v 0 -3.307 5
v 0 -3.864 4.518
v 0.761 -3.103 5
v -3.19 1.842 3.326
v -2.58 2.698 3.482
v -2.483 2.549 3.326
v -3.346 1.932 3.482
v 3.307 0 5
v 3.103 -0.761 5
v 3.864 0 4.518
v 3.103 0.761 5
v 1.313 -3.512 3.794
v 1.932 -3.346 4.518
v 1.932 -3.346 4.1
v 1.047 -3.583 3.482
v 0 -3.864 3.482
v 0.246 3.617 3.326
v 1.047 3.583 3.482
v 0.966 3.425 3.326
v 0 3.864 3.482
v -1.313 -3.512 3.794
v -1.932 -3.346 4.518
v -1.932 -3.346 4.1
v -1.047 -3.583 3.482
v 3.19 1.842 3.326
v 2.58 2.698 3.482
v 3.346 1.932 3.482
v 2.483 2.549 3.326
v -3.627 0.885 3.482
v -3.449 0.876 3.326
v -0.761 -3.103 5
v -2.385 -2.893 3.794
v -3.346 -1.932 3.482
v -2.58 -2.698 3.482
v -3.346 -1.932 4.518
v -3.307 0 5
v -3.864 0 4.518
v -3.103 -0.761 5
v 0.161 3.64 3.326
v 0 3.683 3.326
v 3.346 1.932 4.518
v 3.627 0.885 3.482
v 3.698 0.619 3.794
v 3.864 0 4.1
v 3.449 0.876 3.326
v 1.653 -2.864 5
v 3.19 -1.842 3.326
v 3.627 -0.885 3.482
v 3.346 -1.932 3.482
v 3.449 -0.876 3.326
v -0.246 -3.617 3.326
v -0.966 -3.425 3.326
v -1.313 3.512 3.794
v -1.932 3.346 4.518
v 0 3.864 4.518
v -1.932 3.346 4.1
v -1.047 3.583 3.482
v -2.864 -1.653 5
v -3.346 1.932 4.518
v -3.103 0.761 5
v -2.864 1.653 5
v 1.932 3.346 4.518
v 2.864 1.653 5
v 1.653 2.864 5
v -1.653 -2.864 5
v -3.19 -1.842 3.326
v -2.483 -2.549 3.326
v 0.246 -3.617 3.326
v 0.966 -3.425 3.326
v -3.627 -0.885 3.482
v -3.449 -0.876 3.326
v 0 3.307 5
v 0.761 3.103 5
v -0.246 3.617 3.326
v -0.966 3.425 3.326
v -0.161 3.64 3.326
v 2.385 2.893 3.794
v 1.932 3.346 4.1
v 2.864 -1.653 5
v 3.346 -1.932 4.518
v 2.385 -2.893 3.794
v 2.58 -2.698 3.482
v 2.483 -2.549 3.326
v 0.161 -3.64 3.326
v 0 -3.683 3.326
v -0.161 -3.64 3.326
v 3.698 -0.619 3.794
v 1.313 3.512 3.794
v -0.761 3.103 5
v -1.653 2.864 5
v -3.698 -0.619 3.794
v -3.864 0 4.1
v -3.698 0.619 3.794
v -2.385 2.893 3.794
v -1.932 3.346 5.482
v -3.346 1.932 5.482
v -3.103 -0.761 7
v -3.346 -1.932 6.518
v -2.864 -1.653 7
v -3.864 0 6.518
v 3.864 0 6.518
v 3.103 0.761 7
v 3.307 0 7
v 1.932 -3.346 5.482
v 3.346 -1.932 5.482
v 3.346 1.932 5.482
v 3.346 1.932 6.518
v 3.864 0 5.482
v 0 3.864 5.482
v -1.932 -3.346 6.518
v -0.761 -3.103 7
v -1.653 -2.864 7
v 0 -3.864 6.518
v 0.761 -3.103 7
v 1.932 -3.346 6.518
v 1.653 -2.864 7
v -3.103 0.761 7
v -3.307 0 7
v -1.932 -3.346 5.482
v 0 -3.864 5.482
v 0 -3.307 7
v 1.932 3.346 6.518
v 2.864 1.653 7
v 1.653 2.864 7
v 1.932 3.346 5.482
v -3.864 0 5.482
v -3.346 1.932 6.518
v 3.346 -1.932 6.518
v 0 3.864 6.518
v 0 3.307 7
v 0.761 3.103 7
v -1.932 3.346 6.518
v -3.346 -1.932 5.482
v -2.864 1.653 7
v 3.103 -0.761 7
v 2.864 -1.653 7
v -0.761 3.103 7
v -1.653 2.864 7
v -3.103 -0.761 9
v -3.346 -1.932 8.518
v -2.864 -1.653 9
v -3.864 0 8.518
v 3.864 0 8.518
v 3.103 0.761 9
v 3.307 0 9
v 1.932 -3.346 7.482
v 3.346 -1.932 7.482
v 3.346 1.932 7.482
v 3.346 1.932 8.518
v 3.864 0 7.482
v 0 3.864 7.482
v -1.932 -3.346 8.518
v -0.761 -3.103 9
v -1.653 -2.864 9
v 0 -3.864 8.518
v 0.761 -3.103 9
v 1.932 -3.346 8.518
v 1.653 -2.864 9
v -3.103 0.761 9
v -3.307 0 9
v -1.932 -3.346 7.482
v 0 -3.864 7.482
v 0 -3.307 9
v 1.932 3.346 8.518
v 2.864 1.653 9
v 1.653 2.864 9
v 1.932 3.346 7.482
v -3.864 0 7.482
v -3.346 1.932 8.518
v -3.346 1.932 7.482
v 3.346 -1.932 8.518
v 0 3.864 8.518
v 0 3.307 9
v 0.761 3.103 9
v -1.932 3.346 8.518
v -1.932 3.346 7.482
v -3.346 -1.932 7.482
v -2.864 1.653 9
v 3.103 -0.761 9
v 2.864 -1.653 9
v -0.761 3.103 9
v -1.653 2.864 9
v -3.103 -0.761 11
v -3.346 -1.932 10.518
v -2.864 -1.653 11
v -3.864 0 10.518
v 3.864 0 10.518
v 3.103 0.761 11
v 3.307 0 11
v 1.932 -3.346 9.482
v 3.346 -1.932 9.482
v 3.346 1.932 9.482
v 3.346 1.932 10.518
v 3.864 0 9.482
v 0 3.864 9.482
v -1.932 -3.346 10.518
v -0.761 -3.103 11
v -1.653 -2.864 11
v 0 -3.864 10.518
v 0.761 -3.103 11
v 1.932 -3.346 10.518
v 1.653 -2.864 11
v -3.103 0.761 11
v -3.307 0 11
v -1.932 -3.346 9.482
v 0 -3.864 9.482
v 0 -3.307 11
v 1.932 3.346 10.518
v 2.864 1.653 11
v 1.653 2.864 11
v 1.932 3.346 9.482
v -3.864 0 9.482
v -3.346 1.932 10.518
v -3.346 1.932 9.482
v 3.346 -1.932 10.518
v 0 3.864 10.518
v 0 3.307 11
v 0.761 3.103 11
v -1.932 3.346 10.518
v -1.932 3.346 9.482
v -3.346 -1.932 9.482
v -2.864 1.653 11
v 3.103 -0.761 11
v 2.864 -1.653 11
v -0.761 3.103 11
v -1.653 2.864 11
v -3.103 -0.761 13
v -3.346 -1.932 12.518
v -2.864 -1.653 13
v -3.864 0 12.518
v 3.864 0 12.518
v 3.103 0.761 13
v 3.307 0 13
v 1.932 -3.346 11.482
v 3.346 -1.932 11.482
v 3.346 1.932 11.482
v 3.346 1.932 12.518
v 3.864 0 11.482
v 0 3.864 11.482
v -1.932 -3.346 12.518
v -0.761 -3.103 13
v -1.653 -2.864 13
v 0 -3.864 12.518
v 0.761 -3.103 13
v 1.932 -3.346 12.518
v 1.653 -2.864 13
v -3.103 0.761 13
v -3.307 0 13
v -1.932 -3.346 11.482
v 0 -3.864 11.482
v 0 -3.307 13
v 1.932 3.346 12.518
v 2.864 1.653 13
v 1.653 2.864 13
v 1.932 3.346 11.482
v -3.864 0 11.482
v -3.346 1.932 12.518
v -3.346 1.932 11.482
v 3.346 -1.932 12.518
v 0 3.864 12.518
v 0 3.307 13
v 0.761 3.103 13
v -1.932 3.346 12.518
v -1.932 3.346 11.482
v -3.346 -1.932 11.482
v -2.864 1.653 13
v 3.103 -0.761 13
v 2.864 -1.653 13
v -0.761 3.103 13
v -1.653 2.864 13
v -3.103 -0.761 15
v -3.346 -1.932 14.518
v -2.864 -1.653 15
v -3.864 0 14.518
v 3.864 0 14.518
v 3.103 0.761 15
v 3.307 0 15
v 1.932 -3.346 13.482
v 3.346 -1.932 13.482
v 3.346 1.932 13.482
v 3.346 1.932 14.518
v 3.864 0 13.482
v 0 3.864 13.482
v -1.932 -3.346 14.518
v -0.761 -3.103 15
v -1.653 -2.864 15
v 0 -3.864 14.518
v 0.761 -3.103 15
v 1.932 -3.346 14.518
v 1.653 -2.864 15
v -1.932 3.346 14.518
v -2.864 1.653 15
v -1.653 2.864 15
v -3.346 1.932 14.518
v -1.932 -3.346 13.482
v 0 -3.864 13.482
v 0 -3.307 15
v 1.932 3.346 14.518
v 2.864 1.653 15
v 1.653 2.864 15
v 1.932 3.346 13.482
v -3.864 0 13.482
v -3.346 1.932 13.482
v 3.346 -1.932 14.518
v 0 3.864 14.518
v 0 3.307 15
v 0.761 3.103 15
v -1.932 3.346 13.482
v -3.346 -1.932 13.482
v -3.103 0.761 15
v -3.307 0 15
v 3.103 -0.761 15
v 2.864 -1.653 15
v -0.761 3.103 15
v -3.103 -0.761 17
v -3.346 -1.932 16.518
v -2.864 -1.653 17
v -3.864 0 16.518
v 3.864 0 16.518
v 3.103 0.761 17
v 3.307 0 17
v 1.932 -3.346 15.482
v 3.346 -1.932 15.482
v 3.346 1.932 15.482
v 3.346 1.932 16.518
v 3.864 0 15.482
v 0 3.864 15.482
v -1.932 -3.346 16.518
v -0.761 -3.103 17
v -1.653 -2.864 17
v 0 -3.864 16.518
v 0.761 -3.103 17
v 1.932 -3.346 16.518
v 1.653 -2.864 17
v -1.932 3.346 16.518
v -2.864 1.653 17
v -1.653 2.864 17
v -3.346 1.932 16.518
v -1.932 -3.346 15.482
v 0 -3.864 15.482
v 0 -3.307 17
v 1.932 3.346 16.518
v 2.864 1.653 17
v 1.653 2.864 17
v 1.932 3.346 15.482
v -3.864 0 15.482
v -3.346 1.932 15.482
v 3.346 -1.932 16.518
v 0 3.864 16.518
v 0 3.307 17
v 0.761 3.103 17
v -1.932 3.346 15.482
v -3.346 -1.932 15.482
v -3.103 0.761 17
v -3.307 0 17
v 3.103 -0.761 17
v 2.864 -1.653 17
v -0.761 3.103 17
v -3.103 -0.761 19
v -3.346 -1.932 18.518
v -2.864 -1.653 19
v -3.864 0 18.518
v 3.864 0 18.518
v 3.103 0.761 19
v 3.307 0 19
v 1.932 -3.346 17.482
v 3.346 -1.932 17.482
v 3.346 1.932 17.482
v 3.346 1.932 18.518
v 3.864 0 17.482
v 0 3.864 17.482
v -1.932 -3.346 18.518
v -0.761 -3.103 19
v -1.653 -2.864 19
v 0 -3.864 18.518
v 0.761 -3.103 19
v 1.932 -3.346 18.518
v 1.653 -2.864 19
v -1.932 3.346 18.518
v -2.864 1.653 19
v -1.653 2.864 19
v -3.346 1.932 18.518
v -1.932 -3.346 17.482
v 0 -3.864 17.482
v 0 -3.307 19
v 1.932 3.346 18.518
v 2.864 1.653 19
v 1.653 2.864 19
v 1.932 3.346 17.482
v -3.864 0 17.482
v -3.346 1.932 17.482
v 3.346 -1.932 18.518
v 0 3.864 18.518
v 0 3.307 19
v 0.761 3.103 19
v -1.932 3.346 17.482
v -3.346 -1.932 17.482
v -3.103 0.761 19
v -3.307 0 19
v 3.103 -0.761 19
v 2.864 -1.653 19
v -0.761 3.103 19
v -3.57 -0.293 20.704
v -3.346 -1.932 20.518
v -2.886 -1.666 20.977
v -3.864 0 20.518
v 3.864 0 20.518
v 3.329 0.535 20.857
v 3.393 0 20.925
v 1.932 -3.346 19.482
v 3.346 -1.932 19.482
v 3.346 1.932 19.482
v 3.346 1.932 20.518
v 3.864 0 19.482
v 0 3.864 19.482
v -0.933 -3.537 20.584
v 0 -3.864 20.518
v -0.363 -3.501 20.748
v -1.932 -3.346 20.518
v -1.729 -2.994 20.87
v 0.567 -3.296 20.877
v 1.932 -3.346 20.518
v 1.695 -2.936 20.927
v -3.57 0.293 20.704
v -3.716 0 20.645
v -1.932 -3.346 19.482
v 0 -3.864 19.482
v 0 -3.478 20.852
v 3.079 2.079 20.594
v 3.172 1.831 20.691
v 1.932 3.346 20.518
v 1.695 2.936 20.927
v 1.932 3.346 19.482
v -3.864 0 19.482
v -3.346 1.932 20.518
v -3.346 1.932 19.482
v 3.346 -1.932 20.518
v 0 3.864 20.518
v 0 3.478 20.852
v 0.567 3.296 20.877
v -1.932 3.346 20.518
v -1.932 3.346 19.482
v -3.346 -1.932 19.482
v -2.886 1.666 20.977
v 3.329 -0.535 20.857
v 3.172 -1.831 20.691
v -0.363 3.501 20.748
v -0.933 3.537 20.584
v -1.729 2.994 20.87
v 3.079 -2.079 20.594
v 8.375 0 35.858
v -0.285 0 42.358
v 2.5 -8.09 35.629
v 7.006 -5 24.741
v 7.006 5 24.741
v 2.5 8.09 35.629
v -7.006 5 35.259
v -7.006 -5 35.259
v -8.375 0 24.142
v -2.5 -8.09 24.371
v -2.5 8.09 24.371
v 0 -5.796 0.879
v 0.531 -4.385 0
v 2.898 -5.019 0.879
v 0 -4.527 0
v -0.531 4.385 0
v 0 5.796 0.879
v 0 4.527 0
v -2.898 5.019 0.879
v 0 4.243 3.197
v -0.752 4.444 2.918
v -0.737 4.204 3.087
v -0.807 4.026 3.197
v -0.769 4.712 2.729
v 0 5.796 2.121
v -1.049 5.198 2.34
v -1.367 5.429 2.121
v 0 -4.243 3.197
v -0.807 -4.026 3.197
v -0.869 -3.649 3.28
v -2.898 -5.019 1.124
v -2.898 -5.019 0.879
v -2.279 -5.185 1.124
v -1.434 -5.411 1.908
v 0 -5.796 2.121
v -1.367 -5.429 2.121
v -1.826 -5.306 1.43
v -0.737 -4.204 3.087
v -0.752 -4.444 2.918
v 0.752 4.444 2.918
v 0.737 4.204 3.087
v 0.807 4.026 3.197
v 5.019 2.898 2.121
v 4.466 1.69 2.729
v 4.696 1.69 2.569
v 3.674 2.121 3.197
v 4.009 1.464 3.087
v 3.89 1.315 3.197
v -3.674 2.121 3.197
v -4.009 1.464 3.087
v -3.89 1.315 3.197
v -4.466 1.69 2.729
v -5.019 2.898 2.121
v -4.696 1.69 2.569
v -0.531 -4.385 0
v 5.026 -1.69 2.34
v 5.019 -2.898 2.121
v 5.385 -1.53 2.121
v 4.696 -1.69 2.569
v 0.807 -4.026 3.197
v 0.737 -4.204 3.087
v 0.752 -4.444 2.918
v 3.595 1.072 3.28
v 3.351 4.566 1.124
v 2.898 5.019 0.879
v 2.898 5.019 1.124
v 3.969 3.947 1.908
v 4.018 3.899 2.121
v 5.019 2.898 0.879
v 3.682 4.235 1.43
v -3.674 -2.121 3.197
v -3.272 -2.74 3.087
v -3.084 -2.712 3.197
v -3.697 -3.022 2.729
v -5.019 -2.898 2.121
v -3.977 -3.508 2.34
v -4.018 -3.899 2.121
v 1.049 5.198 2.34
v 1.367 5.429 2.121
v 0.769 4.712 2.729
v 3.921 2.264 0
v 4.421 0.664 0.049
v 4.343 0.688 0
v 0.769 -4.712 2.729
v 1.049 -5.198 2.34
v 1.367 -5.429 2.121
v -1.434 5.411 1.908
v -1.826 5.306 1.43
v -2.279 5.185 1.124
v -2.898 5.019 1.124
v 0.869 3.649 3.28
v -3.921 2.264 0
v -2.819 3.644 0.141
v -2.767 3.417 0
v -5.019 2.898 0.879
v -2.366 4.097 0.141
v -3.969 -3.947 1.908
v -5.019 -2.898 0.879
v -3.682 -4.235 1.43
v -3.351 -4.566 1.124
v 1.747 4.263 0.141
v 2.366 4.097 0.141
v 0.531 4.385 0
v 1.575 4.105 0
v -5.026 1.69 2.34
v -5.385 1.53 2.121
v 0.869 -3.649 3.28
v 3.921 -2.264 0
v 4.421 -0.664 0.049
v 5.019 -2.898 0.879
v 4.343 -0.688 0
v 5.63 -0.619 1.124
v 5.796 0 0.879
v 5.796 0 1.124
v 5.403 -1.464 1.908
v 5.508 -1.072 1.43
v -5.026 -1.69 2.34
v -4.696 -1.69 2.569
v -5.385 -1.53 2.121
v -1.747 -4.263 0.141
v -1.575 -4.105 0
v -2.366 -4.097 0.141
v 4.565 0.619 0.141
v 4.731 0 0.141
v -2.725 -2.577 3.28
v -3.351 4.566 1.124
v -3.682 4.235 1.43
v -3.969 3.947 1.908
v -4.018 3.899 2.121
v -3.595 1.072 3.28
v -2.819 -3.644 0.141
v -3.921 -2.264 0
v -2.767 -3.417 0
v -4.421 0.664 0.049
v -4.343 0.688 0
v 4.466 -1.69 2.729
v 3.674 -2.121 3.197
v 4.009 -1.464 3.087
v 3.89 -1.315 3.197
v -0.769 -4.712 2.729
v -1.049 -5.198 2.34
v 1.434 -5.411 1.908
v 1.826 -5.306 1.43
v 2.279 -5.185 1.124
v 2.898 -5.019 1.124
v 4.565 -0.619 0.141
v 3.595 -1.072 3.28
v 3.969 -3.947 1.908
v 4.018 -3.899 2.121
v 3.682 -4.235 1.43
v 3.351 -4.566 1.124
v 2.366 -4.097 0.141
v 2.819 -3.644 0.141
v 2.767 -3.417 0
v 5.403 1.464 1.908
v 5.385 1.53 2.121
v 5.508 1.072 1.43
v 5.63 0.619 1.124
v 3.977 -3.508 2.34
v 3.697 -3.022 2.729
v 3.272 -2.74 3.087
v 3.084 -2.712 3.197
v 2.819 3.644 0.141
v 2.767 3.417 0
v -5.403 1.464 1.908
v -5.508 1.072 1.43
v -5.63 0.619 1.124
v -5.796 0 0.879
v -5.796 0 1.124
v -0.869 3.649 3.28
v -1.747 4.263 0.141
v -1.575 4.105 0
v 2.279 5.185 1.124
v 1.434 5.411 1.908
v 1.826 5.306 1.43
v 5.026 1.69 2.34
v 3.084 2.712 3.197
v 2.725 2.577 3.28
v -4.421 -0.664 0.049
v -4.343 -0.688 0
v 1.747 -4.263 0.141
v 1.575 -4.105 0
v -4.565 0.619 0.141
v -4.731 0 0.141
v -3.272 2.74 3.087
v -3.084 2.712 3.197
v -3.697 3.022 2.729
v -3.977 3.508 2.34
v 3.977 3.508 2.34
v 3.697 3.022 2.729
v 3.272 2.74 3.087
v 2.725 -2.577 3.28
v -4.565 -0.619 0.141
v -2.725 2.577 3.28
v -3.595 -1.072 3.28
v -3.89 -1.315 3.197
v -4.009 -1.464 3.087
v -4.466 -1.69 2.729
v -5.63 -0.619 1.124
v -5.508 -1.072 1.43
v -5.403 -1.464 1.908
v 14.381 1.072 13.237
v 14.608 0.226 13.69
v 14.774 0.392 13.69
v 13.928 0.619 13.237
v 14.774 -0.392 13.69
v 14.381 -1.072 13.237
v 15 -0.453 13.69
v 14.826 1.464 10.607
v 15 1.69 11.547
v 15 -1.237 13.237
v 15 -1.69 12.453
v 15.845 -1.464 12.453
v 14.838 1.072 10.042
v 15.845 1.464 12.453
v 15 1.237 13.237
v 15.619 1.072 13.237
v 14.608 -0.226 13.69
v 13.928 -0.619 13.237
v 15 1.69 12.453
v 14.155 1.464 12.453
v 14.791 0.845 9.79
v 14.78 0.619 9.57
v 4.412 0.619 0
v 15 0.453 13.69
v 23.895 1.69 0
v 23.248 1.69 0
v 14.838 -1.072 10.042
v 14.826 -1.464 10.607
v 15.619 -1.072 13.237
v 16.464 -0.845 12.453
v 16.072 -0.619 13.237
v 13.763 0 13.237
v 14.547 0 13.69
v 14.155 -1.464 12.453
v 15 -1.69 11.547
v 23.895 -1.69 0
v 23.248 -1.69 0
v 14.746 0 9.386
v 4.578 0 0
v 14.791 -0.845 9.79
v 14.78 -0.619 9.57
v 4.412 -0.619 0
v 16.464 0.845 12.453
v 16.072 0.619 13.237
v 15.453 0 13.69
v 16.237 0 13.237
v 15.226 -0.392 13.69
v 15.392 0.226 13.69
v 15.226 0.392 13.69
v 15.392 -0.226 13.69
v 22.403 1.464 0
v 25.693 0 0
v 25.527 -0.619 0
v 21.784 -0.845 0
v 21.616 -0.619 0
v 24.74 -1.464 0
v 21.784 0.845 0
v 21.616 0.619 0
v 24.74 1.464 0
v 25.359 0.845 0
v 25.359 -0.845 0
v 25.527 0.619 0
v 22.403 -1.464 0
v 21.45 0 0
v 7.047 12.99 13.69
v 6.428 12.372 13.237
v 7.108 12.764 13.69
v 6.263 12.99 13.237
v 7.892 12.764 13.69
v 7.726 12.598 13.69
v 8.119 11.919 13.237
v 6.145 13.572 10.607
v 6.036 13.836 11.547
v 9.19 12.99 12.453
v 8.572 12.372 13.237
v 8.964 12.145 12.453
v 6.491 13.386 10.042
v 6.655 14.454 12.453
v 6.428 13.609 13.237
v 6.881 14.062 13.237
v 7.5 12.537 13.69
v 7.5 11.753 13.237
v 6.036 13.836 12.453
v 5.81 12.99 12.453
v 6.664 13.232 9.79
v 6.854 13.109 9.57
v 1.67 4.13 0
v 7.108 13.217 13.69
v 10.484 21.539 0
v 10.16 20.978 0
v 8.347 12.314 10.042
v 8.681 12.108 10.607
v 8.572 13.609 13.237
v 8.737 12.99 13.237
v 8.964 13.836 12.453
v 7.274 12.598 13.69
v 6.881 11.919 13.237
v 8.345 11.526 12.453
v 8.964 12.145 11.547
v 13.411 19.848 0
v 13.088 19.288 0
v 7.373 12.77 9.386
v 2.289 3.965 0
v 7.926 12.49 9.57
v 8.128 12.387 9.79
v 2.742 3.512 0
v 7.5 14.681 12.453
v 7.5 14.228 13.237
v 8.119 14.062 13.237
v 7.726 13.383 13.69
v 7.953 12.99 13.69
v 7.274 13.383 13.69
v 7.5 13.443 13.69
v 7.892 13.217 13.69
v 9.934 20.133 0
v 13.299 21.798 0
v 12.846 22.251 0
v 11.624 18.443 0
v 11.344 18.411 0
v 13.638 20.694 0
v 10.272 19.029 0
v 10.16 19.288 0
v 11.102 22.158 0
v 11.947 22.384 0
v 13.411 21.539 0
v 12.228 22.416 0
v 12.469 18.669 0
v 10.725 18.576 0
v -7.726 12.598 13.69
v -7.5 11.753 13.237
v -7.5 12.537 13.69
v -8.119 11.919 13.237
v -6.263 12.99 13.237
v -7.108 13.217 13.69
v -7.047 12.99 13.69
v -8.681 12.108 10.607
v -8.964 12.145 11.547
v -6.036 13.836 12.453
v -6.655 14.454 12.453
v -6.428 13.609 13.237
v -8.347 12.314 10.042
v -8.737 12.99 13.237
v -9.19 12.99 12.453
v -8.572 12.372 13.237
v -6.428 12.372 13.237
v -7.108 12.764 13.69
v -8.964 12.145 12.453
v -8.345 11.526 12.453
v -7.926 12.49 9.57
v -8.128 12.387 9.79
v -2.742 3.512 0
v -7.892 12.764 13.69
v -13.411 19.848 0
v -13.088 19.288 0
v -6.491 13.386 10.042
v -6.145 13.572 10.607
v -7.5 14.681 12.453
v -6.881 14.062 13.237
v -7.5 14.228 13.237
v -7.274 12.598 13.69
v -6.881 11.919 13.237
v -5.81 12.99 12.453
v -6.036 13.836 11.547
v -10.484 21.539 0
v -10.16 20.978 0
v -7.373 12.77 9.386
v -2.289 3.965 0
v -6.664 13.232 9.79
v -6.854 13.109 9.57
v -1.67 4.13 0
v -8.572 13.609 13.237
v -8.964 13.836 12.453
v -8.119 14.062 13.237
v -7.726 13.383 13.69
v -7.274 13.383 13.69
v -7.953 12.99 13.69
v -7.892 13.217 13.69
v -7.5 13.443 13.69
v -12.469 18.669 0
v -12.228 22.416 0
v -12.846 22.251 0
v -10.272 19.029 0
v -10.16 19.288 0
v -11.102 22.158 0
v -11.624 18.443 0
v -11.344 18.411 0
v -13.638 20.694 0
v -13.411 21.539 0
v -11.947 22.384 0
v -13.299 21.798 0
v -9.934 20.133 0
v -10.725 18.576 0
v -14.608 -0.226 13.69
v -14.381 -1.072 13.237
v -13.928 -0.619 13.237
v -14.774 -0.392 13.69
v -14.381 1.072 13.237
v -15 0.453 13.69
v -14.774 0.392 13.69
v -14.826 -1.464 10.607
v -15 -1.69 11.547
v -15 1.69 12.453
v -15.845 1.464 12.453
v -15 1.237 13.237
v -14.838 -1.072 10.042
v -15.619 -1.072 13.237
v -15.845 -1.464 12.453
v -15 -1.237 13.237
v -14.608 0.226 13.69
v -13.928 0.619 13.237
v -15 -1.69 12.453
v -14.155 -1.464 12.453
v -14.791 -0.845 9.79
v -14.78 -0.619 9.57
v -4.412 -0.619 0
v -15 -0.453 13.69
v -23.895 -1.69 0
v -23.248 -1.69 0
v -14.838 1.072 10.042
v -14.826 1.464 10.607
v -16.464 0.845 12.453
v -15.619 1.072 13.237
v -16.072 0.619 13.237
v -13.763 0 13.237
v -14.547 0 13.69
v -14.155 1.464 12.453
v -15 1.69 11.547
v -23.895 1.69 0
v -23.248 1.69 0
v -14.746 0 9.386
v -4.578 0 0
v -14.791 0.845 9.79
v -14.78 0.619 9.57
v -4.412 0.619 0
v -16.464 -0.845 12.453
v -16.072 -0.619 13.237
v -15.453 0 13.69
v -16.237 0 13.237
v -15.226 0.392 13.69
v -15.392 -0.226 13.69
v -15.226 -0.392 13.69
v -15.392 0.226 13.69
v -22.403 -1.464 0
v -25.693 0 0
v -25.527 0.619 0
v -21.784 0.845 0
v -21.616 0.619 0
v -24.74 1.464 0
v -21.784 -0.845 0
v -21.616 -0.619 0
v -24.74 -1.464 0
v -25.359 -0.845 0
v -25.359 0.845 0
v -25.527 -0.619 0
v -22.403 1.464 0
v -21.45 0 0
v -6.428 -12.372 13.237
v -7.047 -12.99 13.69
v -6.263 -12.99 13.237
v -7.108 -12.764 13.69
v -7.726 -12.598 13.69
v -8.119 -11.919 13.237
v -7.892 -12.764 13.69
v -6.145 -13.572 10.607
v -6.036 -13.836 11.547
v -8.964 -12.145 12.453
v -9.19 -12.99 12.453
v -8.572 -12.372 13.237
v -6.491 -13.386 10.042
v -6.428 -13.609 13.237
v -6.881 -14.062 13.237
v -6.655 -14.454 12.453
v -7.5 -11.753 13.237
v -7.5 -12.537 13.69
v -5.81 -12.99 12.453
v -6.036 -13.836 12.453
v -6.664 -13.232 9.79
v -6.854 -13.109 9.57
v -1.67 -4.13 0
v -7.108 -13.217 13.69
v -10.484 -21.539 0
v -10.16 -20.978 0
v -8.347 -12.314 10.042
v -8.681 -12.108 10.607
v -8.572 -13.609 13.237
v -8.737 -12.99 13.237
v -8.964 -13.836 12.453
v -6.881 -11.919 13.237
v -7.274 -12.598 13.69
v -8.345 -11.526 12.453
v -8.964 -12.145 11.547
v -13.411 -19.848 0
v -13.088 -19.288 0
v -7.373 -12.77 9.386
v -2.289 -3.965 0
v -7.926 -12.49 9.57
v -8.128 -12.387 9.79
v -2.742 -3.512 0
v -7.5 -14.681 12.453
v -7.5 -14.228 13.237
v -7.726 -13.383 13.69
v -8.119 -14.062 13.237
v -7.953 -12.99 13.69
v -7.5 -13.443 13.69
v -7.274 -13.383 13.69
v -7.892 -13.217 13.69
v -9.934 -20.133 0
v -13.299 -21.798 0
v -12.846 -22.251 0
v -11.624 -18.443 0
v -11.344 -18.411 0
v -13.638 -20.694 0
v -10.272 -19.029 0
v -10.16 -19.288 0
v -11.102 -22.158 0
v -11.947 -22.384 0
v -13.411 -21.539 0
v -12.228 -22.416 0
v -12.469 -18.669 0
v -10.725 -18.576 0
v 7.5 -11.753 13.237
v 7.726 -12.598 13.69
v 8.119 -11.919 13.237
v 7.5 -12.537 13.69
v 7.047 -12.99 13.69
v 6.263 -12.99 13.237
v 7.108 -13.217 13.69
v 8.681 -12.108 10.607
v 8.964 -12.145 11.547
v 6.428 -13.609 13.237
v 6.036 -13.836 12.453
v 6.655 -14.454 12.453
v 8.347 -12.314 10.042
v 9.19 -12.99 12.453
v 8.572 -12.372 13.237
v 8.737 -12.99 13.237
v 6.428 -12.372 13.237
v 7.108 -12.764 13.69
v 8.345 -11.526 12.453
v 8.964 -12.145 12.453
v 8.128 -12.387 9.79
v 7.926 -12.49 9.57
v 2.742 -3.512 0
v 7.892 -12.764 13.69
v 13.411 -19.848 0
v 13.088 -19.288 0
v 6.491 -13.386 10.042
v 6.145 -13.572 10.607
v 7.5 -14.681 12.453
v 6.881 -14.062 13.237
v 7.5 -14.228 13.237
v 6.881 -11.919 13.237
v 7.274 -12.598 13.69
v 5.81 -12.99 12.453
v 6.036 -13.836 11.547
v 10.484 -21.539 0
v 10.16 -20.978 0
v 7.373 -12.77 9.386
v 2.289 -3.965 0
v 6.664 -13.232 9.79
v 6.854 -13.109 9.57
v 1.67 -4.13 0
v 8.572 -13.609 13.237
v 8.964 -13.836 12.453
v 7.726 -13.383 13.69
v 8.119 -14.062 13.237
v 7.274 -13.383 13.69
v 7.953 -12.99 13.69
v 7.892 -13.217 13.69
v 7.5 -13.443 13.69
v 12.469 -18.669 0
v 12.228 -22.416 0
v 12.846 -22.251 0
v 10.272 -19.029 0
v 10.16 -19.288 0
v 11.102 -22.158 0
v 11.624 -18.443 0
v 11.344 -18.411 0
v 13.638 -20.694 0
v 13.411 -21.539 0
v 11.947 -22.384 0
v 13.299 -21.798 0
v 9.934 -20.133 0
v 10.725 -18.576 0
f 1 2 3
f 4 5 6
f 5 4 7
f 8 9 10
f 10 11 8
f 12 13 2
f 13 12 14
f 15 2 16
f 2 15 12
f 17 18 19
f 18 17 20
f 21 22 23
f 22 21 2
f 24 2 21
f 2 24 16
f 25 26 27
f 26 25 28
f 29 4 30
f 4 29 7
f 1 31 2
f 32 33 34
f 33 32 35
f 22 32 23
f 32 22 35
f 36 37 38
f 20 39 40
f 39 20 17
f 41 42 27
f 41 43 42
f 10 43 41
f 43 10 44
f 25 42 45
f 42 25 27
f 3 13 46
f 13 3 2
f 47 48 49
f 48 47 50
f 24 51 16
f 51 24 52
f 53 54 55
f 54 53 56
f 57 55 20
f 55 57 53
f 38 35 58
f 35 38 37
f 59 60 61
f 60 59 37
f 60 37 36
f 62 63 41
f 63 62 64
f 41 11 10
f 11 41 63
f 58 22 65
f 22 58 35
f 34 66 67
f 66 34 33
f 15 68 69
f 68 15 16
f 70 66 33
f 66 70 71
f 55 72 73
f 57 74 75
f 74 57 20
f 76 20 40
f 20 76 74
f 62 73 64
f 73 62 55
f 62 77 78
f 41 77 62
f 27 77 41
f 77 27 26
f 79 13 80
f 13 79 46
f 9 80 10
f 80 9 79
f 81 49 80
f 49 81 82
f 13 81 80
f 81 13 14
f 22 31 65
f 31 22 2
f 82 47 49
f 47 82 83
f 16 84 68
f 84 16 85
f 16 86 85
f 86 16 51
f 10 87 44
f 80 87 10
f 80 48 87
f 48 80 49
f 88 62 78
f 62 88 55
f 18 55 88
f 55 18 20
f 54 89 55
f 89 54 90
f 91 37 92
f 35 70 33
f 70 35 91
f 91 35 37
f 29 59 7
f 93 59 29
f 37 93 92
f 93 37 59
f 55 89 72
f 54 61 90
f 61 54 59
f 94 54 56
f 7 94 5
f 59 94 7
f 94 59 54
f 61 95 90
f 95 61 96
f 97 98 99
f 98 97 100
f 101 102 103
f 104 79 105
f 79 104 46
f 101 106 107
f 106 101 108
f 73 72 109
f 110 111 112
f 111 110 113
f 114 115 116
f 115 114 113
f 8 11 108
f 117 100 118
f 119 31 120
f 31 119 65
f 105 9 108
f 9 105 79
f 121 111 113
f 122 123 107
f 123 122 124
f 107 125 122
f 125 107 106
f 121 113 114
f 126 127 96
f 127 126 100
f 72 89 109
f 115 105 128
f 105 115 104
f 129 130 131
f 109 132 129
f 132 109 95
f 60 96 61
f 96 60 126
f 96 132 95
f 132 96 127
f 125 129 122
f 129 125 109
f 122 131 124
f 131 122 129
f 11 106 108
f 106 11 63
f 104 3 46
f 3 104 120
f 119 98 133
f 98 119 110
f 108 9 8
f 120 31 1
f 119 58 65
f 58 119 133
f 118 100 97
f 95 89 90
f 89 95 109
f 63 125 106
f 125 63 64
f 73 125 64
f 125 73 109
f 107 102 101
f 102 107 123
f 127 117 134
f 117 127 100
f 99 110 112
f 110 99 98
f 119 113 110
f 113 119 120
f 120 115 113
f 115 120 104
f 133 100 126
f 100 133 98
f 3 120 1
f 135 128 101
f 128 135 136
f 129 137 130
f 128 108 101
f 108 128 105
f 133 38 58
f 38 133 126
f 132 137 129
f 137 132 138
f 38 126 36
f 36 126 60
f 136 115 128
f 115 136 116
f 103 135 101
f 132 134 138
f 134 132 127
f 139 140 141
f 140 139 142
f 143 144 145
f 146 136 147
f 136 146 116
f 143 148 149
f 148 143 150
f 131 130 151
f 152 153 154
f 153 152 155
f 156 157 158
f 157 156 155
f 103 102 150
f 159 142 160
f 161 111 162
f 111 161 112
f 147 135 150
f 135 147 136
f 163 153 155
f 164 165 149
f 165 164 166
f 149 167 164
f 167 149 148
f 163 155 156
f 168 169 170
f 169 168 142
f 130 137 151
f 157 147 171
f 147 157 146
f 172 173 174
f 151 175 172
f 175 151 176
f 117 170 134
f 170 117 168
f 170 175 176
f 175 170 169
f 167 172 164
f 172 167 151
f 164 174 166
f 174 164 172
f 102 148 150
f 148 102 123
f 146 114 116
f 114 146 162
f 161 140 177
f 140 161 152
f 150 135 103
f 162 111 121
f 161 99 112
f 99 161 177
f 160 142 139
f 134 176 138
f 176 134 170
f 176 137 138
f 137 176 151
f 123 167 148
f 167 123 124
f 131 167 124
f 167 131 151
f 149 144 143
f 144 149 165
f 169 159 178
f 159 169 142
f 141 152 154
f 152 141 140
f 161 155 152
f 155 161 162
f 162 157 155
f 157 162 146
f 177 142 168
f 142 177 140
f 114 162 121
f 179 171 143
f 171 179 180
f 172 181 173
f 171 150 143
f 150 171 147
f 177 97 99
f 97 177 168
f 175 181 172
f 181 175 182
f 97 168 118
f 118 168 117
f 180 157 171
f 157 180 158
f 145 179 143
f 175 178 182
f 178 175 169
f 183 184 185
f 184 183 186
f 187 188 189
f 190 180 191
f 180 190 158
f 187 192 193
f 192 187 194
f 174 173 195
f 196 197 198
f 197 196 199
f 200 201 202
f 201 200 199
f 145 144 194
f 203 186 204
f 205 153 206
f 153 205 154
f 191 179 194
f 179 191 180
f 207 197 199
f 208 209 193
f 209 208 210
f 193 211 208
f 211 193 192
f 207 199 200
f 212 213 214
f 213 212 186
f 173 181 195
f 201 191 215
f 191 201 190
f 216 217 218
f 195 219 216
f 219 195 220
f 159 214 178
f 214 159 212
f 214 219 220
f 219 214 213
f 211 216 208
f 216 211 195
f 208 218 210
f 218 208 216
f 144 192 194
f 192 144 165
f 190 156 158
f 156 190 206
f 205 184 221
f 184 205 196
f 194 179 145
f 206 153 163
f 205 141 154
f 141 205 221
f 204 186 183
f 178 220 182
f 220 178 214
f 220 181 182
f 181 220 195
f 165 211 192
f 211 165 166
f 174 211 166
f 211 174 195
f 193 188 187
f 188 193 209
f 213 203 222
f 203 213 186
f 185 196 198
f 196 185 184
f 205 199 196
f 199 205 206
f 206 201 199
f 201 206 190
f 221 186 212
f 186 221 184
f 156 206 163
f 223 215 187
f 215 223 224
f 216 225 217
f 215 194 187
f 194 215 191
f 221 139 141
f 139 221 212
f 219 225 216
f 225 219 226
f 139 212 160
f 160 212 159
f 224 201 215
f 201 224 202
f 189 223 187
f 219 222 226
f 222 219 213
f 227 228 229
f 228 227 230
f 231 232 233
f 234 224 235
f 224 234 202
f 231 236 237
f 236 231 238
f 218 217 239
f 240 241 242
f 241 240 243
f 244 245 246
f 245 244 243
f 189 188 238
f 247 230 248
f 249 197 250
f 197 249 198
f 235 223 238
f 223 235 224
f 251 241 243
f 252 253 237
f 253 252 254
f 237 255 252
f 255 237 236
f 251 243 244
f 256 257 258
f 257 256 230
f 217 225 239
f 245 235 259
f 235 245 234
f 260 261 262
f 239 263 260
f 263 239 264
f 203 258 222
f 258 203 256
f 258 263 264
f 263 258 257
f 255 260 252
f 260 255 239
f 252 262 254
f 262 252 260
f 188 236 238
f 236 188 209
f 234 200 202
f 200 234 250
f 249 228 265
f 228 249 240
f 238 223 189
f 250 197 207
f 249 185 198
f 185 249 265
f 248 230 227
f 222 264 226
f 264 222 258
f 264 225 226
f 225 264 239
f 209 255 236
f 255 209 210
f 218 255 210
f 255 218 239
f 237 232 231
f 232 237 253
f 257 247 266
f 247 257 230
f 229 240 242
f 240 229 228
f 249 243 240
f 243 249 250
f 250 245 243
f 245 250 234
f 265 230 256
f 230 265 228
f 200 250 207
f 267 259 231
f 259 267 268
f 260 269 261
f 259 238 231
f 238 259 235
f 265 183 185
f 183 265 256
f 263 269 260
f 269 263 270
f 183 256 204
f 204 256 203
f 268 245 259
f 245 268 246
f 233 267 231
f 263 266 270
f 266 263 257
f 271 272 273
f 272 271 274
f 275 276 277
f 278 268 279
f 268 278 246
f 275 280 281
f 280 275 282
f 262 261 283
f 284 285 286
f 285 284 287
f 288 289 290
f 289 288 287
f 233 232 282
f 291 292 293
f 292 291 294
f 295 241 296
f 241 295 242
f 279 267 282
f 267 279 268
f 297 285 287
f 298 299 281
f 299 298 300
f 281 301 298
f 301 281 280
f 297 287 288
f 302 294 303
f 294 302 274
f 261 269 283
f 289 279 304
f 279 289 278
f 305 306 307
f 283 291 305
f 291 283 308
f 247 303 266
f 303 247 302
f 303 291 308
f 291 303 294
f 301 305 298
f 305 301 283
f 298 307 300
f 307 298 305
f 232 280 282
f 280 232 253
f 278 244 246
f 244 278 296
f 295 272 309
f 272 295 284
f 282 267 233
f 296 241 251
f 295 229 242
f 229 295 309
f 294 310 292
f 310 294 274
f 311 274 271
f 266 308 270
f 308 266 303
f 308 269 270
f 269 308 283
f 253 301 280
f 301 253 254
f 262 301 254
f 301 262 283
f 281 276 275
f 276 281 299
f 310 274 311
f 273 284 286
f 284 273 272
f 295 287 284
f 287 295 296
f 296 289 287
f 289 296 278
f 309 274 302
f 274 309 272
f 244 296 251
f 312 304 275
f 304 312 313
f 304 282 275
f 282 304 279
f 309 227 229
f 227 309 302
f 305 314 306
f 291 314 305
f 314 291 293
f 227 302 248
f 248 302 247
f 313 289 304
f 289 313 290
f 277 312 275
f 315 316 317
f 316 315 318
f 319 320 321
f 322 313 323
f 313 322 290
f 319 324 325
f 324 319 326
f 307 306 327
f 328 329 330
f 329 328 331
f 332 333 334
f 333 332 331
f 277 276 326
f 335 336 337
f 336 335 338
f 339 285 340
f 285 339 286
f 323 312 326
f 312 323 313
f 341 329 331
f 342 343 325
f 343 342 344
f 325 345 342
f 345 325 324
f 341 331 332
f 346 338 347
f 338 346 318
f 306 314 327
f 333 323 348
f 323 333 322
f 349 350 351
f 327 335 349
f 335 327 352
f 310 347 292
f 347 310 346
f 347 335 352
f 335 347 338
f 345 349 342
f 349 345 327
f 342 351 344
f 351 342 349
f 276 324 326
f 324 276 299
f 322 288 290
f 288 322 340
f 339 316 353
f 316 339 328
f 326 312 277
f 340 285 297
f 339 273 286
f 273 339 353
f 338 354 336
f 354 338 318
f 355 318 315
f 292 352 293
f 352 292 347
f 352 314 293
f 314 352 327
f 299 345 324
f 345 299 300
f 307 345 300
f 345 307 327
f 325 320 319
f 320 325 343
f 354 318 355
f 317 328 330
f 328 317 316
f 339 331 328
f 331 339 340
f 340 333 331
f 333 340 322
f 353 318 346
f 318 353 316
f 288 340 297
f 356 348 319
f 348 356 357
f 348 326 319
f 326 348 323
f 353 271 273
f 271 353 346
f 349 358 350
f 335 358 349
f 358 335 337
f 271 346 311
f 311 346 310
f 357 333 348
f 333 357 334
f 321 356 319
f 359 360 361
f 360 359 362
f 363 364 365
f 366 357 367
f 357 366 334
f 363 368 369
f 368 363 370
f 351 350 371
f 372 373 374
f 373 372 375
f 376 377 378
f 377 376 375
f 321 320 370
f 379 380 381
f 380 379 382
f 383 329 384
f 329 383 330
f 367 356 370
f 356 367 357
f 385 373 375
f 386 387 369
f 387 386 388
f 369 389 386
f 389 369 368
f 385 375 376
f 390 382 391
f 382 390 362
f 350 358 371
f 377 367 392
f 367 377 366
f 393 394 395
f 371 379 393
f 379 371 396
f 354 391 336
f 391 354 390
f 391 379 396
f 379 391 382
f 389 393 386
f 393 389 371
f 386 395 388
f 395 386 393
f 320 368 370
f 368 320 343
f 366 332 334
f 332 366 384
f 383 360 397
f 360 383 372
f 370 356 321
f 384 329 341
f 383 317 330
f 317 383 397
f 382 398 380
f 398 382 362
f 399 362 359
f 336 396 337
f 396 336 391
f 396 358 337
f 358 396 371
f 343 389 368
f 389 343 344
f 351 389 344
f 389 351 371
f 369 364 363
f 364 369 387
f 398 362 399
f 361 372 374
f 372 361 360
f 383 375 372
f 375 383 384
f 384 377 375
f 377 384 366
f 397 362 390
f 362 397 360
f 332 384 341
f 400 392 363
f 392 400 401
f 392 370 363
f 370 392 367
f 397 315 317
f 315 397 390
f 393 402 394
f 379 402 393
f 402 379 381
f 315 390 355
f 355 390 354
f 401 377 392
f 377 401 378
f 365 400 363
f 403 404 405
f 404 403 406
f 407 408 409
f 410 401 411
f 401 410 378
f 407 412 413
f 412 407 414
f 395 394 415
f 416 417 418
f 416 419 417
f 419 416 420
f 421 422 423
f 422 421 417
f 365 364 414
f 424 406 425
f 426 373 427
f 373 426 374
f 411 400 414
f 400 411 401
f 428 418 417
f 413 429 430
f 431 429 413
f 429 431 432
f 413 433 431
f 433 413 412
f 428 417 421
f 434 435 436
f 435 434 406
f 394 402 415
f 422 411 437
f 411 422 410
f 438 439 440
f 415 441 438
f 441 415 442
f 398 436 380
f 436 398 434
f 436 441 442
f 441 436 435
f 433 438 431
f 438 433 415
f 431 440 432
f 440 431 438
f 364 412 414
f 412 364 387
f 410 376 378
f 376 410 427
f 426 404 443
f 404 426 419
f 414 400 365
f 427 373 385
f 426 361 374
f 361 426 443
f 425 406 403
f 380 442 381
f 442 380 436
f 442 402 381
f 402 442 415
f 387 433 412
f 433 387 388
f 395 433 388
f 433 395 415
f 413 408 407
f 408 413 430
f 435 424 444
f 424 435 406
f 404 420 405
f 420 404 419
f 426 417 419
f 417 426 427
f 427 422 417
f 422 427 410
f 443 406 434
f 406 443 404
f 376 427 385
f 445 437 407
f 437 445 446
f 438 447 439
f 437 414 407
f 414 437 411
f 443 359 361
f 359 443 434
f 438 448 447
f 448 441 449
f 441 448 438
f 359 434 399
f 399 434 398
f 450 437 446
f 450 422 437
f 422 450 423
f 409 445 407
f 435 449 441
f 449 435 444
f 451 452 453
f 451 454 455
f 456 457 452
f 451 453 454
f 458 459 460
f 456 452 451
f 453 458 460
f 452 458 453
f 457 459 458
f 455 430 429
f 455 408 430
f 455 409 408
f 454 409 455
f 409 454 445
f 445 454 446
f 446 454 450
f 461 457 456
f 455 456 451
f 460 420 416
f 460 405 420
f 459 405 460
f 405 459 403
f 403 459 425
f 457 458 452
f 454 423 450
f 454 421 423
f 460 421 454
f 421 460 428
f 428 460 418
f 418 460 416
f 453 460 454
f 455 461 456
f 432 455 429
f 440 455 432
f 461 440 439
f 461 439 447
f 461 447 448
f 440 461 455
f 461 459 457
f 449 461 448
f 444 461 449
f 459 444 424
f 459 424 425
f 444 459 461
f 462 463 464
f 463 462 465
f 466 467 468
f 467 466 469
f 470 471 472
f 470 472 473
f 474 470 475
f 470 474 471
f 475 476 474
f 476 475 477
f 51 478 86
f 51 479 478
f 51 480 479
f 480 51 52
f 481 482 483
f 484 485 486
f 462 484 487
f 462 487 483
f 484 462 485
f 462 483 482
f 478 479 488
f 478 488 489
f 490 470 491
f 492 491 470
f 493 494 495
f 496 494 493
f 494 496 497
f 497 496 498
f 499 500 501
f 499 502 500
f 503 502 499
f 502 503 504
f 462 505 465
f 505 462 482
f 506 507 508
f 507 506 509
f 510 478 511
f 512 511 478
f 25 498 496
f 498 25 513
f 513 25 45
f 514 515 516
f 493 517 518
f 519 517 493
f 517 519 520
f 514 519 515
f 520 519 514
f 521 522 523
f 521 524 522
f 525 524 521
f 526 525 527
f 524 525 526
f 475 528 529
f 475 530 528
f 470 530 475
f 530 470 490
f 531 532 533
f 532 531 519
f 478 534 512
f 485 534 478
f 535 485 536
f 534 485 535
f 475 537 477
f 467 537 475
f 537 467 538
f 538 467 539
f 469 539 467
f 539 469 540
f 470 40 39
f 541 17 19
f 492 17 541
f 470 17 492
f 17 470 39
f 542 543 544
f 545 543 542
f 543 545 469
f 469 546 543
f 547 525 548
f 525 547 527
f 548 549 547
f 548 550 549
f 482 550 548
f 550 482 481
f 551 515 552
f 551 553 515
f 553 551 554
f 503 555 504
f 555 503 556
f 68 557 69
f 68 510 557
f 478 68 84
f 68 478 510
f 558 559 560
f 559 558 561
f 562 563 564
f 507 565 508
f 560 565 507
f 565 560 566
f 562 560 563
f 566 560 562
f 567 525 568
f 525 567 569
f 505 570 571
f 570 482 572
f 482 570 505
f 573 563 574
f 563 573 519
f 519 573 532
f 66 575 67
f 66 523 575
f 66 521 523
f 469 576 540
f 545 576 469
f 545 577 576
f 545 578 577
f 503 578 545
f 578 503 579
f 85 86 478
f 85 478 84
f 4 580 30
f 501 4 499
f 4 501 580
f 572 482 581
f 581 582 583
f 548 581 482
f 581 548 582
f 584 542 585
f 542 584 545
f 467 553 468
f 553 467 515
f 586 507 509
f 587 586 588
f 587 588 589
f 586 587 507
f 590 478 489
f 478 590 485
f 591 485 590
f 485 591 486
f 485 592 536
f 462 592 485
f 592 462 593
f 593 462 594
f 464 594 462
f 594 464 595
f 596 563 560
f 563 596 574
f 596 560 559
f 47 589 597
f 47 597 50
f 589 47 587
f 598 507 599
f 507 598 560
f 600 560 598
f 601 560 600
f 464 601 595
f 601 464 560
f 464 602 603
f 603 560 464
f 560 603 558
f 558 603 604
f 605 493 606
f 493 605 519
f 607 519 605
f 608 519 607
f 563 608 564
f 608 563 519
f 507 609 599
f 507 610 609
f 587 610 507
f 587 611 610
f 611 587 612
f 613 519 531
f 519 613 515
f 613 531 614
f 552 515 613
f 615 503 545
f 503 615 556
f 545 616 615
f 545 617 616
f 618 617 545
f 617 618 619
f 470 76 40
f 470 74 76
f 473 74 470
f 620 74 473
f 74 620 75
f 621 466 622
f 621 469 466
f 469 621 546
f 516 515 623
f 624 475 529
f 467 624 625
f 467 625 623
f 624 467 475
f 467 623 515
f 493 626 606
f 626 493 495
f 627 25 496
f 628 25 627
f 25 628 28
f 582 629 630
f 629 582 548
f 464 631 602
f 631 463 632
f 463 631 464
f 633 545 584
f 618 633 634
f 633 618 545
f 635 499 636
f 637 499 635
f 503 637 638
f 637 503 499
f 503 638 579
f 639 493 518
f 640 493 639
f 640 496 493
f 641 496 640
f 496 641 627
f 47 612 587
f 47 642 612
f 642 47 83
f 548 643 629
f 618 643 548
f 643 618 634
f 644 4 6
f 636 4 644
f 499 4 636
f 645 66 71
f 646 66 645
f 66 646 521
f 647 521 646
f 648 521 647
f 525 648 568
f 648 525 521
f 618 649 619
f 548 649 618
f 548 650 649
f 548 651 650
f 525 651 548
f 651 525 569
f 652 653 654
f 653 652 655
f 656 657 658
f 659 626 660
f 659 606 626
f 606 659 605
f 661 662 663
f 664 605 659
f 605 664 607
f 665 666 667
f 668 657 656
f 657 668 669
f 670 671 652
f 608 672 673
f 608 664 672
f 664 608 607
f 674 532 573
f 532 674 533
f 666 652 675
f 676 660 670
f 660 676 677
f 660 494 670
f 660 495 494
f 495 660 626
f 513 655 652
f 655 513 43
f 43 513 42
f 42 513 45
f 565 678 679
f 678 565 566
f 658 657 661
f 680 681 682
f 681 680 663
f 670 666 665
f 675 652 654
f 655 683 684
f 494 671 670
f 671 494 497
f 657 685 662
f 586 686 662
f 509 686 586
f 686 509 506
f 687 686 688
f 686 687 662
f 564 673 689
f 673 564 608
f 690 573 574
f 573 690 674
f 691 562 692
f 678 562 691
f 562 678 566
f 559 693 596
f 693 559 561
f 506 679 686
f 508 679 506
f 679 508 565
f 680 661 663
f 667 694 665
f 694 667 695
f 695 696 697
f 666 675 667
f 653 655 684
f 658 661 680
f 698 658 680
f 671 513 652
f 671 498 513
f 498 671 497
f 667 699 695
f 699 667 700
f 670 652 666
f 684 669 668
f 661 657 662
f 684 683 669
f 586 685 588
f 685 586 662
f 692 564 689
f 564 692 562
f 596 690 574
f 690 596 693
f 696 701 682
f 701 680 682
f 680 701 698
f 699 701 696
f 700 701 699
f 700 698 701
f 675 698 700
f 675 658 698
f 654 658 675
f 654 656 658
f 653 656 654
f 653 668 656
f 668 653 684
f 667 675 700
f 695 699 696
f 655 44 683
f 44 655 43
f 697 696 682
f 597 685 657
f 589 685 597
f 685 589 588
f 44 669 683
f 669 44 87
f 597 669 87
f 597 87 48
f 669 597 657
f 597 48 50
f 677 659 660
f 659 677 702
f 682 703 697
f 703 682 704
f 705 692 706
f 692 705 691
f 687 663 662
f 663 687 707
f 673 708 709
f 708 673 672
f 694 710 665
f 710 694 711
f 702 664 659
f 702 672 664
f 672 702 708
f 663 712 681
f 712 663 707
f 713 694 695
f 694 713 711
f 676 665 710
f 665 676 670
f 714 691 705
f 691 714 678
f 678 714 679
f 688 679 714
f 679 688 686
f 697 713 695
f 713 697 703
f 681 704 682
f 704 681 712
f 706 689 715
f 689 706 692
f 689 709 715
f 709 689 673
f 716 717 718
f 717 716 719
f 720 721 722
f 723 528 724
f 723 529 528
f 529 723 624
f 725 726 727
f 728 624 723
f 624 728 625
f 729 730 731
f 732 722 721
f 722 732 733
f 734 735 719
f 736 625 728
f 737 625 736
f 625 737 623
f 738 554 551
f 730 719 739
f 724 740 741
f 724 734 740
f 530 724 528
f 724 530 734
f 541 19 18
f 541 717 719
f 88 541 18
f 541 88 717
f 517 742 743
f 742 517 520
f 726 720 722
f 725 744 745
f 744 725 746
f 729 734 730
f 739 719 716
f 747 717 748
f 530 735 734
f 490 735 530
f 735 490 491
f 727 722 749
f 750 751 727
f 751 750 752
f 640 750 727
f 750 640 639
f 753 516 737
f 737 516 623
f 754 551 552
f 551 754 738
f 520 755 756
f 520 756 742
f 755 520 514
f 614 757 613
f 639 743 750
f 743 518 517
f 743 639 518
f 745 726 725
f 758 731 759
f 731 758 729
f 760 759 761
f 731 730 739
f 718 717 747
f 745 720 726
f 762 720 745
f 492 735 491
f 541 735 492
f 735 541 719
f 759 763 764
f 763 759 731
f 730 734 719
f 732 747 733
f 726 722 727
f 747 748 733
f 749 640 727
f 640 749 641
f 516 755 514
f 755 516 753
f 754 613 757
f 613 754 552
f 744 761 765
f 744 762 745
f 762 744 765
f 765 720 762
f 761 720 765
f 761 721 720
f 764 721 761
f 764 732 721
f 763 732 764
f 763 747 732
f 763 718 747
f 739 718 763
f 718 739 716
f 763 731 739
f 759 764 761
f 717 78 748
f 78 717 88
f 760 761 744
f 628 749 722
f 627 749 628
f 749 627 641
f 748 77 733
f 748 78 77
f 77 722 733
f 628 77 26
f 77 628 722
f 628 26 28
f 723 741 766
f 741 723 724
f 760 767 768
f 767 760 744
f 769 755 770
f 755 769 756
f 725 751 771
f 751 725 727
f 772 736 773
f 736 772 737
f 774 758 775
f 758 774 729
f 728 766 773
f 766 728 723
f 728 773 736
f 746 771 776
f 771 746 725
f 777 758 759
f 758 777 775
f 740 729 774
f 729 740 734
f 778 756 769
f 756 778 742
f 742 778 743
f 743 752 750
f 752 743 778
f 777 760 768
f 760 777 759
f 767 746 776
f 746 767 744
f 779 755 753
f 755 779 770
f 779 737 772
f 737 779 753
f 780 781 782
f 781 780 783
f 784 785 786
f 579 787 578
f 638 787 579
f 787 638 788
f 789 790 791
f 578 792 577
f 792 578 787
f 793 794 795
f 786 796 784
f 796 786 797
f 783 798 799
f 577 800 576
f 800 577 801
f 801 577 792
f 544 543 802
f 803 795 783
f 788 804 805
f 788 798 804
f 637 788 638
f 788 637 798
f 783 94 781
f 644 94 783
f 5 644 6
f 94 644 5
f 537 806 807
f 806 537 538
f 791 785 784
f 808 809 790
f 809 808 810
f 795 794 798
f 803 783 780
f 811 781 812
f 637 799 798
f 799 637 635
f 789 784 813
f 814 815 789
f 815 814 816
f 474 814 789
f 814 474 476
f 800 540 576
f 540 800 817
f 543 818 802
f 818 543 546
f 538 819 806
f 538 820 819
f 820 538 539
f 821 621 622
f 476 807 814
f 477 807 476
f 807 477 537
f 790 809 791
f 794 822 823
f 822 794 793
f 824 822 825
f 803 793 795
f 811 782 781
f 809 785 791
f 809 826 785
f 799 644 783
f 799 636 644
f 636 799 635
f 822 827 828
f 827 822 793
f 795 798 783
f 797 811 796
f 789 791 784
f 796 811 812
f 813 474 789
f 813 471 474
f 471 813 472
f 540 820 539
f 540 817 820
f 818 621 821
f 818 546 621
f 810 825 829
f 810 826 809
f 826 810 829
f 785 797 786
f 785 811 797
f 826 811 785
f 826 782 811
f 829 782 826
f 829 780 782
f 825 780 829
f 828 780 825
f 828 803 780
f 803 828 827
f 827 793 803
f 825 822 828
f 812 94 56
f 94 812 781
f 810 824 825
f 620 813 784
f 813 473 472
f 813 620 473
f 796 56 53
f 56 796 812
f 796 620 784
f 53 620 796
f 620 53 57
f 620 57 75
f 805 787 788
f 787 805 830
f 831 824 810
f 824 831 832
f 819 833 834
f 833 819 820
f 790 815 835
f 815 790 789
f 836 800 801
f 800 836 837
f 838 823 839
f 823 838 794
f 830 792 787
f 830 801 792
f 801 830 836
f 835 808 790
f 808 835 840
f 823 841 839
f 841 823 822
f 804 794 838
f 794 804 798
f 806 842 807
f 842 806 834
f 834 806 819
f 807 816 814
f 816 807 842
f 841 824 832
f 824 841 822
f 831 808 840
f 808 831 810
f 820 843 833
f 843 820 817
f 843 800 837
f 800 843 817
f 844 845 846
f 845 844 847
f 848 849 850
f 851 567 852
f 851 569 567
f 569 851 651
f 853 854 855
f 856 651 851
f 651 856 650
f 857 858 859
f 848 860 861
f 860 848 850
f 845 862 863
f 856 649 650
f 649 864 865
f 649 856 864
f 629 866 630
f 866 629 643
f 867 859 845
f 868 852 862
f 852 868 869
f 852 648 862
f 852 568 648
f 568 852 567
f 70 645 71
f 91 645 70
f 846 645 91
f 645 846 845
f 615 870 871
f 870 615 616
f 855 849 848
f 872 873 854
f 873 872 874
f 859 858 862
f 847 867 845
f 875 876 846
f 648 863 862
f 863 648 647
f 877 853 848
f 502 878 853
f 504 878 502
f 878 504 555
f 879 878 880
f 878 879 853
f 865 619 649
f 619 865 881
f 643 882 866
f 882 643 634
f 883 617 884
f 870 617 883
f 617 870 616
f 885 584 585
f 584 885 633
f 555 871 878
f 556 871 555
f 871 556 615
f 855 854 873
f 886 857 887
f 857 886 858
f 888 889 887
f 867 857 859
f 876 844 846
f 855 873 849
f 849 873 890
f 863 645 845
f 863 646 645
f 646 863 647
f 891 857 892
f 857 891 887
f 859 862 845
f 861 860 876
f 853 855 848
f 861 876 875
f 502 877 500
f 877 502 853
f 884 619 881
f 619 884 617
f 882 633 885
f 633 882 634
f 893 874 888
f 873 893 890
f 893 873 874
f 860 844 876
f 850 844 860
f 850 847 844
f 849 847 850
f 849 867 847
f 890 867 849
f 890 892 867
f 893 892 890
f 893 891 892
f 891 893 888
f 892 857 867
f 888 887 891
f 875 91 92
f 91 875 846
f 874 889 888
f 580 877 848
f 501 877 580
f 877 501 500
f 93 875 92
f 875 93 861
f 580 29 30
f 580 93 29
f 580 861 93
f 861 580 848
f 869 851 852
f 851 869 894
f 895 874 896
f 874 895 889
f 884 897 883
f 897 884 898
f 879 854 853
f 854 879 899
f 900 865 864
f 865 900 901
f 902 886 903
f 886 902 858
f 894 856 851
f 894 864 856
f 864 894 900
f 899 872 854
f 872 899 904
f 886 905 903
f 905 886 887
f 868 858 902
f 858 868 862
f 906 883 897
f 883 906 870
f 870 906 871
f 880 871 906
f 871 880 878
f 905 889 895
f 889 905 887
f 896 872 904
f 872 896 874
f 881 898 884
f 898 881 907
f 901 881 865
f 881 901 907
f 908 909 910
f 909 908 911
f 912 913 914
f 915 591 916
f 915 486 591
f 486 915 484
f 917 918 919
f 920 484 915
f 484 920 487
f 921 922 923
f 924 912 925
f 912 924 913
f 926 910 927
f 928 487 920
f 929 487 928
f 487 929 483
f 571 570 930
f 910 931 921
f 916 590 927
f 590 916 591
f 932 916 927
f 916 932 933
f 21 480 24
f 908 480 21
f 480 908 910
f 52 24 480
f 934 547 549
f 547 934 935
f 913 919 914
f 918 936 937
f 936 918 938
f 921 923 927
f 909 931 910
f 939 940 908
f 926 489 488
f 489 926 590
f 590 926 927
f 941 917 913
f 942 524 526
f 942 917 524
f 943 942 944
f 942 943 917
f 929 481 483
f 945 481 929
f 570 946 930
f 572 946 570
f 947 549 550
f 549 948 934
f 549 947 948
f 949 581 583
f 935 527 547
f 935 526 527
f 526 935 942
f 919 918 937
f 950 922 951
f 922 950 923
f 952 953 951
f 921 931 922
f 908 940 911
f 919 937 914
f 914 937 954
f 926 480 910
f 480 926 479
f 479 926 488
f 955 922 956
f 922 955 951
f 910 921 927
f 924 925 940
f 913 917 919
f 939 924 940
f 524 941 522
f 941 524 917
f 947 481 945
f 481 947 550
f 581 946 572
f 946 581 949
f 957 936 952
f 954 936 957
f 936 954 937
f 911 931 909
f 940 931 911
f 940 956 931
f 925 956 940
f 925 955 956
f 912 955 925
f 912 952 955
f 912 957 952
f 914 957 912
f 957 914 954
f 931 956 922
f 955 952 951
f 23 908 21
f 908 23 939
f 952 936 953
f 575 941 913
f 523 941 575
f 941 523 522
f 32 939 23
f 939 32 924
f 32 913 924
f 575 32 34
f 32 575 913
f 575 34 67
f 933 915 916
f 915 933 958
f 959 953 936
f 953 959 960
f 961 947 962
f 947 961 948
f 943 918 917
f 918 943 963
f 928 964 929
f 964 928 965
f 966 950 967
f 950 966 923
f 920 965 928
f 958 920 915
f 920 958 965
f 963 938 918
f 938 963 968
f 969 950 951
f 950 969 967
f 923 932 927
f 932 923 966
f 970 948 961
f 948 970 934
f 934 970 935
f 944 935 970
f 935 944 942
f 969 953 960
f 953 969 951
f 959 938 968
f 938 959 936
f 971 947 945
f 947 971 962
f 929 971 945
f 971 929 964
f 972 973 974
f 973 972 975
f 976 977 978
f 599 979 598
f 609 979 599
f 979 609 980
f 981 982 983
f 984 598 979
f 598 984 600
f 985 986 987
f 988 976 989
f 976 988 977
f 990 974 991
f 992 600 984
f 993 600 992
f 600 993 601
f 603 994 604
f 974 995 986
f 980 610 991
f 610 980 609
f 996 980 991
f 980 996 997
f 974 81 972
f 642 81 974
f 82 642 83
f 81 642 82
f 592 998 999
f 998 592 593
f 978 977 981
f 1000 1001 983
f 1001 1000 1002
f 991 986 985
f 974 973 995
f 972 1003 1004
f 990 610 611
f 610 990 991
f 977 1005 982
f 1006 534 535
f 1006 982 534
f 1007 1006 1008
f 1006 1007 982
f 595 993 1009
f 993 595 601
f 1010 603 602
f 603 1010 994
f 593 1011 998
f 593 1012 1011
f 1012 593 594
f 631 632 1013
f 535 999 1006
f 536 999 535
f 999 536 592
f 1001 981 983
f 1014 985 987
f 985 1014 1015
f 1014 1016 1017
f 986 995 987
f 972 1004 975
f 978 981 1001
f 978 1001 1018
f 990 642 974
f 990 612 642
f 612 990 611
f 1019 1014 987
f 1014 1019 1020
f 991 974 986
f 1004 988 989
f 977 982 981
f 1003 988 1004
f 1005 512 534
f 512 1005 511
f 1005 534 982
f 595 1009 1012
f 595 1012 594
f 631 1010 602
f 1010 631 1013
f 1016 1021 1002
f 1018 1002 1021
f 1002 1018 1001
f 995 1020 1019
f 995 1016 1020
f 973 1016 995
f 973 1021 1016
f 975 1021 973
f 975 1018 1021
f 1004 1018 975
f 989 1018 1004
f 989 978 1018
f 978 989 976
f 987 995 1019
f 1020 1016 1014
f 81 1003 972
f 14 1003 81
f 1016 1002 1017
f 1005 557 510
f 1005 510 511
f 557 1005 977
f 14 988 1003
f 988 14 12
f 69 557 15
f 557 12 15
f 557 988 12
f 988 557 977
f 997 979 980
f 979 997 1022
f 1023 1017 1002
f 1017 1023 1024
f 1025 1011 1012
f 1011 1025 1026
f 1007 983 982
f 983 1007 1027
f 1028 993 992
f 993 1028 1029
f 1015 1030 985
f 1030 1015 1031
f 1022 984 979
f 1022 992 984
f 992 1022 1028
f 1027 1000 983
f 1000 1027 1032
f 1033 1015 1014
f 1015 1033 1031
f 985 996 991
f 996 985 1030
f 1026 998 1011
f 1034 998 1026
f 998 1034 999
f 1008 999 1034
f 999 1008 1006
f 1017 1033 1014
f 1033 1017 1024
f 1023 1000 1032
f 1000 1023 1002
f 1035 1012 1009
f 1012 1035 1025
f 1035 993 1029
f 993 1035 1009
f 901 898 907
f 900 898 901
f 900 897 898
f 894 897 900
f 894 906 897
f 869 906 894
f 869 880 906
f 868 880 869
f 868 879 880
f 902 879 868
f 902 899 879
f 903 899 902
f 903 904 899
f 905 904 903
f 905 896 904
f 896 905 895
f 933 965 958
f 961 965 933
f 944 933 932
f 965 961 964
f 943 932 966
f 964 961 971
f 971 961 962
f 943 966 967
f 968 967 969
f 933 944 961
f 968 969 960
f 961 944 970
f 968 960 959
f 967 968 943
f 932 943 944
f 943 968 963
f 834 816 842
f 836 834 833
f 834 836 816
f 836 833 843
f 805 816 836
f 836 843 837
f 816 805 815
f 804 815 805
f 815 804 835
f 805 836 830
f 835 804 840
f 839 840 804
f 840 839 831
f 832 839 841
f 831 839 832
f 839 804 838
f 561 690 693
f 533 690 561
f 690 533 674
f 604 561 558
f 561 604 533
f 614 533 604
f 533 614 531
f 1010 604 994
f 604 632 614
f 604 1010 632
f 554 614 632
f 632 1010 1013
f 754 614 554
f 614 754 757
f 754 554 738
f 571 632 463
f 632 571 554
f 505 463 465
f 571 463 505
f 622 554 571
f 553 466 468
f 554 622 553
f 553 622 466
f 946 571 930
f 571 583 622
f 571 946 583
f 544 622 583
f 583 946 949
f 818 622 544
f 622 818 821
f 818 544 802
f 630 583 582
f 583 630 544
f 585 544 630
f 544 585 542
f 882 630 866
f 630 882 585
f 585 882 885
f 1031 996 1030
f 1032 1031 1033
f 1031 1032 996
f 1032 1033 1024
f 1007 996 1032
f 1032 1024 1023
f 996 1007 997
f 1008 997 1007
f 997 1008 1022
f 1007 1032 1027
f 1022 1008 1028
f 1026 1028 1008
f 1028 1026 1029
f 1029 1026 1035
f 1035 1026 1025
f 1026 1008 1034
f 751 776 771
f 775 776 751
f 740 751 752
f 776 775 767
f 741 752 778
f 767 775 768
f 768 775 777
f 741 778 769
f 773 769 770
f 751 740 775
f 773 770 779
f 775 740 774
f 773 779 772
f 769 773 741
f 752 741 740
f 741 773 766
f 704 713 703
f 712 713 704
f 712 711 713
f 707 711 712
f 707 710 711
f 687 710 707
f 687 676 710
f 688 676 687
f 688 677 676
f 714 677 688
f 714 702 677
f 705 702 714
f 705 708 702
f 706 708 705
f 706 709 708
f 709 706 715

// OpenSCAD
// Bacteriophage by Erik Wrenholt 2017-02-12
// License: Creative Commons - Attribution

$fn = 12;

leg_count = 6;
leg_width = 1.75;

printable_phage();

module printable_phage() {
    // chop off the bottom of the legs so they are flat on the bottom.
    difference() {
        bacteriophage();
        translate([0,0,-5]) cube([100,100,10], center=true);
    }
}

module bacteriophage() {
    body();
    for(i=[0:leg_count]) {
        rotate((360 / leg_count) * i, [0,0,1])
            leg();
    }
 }

module body() {
    
    // Icosahedral head
    translate([0,0,30]) 
    scale([1,1,1.3])
        rotate(30, [0,1,0]) 
                icosahedron(5);
    
    // Base-Plate
    translate([0,0,1.5])
        scale([1,1,0.4])
            rotate(30, [0,0,1])
                sphere(6, $fn=12);

    // Helical Sheath
    for(i=[2:10]) {
        translate([0,0,i*2])
            scale([1,1,0.5])
                sphere(4);
    }

}

module leg() {
    union() {
        hull() {
            translate([2,0,0]) sphere(leg_width);
            translate([15,0,12]) sphere(leg_width);
        }
        hull() {
            translate([15,0,12]) sphere(leg_width);
            translate([25,0,-2]) sphere(leg_width);
        }
    }
}


// https://www.thingiverse.com/thing:1343285

/*****************************************************************
* Icosahedron   By Adam Anderson
* 
* This module allows for the creation of an icosahedron scaled up 
* by a factor determined by the module parameter. 
* The coordinates for the vertices were taken from
* http://www.sacred-geometry.es/?q=en/content/phi-sacred-solids
*************************************************************/

module icosahedron(a = 2) {
    phi = a * ((1 + sqrt(5)) / 2);
    polyhedron(
        points = [
            [0,-phi, a], [0, phi, a], [0, phi, -a], [0, -phi, -a], [a, 0, phi], [-a, 0, phi], [-a, 0, -phi], 
            [a, 0, -phi], [phi, a, 0], [-phi, a, 0], [-phi, -a, 0], [phi, -a, 0]    
        ],
        faces = [
            [0,5,4], [0,4,11], [11,4,8], [11,8,7], [4,5,1], [4,1,8], [8,1,2], [8,2,7], [1,5,9], [1,9,2], [2,9,6], [2,6,7], [9,5,10], [9,10,6], [6,10,3], [6,3,7], [10,5,0], [10,0,3], [3,0,11], [3,11,7]
        ]
    
    );
}
